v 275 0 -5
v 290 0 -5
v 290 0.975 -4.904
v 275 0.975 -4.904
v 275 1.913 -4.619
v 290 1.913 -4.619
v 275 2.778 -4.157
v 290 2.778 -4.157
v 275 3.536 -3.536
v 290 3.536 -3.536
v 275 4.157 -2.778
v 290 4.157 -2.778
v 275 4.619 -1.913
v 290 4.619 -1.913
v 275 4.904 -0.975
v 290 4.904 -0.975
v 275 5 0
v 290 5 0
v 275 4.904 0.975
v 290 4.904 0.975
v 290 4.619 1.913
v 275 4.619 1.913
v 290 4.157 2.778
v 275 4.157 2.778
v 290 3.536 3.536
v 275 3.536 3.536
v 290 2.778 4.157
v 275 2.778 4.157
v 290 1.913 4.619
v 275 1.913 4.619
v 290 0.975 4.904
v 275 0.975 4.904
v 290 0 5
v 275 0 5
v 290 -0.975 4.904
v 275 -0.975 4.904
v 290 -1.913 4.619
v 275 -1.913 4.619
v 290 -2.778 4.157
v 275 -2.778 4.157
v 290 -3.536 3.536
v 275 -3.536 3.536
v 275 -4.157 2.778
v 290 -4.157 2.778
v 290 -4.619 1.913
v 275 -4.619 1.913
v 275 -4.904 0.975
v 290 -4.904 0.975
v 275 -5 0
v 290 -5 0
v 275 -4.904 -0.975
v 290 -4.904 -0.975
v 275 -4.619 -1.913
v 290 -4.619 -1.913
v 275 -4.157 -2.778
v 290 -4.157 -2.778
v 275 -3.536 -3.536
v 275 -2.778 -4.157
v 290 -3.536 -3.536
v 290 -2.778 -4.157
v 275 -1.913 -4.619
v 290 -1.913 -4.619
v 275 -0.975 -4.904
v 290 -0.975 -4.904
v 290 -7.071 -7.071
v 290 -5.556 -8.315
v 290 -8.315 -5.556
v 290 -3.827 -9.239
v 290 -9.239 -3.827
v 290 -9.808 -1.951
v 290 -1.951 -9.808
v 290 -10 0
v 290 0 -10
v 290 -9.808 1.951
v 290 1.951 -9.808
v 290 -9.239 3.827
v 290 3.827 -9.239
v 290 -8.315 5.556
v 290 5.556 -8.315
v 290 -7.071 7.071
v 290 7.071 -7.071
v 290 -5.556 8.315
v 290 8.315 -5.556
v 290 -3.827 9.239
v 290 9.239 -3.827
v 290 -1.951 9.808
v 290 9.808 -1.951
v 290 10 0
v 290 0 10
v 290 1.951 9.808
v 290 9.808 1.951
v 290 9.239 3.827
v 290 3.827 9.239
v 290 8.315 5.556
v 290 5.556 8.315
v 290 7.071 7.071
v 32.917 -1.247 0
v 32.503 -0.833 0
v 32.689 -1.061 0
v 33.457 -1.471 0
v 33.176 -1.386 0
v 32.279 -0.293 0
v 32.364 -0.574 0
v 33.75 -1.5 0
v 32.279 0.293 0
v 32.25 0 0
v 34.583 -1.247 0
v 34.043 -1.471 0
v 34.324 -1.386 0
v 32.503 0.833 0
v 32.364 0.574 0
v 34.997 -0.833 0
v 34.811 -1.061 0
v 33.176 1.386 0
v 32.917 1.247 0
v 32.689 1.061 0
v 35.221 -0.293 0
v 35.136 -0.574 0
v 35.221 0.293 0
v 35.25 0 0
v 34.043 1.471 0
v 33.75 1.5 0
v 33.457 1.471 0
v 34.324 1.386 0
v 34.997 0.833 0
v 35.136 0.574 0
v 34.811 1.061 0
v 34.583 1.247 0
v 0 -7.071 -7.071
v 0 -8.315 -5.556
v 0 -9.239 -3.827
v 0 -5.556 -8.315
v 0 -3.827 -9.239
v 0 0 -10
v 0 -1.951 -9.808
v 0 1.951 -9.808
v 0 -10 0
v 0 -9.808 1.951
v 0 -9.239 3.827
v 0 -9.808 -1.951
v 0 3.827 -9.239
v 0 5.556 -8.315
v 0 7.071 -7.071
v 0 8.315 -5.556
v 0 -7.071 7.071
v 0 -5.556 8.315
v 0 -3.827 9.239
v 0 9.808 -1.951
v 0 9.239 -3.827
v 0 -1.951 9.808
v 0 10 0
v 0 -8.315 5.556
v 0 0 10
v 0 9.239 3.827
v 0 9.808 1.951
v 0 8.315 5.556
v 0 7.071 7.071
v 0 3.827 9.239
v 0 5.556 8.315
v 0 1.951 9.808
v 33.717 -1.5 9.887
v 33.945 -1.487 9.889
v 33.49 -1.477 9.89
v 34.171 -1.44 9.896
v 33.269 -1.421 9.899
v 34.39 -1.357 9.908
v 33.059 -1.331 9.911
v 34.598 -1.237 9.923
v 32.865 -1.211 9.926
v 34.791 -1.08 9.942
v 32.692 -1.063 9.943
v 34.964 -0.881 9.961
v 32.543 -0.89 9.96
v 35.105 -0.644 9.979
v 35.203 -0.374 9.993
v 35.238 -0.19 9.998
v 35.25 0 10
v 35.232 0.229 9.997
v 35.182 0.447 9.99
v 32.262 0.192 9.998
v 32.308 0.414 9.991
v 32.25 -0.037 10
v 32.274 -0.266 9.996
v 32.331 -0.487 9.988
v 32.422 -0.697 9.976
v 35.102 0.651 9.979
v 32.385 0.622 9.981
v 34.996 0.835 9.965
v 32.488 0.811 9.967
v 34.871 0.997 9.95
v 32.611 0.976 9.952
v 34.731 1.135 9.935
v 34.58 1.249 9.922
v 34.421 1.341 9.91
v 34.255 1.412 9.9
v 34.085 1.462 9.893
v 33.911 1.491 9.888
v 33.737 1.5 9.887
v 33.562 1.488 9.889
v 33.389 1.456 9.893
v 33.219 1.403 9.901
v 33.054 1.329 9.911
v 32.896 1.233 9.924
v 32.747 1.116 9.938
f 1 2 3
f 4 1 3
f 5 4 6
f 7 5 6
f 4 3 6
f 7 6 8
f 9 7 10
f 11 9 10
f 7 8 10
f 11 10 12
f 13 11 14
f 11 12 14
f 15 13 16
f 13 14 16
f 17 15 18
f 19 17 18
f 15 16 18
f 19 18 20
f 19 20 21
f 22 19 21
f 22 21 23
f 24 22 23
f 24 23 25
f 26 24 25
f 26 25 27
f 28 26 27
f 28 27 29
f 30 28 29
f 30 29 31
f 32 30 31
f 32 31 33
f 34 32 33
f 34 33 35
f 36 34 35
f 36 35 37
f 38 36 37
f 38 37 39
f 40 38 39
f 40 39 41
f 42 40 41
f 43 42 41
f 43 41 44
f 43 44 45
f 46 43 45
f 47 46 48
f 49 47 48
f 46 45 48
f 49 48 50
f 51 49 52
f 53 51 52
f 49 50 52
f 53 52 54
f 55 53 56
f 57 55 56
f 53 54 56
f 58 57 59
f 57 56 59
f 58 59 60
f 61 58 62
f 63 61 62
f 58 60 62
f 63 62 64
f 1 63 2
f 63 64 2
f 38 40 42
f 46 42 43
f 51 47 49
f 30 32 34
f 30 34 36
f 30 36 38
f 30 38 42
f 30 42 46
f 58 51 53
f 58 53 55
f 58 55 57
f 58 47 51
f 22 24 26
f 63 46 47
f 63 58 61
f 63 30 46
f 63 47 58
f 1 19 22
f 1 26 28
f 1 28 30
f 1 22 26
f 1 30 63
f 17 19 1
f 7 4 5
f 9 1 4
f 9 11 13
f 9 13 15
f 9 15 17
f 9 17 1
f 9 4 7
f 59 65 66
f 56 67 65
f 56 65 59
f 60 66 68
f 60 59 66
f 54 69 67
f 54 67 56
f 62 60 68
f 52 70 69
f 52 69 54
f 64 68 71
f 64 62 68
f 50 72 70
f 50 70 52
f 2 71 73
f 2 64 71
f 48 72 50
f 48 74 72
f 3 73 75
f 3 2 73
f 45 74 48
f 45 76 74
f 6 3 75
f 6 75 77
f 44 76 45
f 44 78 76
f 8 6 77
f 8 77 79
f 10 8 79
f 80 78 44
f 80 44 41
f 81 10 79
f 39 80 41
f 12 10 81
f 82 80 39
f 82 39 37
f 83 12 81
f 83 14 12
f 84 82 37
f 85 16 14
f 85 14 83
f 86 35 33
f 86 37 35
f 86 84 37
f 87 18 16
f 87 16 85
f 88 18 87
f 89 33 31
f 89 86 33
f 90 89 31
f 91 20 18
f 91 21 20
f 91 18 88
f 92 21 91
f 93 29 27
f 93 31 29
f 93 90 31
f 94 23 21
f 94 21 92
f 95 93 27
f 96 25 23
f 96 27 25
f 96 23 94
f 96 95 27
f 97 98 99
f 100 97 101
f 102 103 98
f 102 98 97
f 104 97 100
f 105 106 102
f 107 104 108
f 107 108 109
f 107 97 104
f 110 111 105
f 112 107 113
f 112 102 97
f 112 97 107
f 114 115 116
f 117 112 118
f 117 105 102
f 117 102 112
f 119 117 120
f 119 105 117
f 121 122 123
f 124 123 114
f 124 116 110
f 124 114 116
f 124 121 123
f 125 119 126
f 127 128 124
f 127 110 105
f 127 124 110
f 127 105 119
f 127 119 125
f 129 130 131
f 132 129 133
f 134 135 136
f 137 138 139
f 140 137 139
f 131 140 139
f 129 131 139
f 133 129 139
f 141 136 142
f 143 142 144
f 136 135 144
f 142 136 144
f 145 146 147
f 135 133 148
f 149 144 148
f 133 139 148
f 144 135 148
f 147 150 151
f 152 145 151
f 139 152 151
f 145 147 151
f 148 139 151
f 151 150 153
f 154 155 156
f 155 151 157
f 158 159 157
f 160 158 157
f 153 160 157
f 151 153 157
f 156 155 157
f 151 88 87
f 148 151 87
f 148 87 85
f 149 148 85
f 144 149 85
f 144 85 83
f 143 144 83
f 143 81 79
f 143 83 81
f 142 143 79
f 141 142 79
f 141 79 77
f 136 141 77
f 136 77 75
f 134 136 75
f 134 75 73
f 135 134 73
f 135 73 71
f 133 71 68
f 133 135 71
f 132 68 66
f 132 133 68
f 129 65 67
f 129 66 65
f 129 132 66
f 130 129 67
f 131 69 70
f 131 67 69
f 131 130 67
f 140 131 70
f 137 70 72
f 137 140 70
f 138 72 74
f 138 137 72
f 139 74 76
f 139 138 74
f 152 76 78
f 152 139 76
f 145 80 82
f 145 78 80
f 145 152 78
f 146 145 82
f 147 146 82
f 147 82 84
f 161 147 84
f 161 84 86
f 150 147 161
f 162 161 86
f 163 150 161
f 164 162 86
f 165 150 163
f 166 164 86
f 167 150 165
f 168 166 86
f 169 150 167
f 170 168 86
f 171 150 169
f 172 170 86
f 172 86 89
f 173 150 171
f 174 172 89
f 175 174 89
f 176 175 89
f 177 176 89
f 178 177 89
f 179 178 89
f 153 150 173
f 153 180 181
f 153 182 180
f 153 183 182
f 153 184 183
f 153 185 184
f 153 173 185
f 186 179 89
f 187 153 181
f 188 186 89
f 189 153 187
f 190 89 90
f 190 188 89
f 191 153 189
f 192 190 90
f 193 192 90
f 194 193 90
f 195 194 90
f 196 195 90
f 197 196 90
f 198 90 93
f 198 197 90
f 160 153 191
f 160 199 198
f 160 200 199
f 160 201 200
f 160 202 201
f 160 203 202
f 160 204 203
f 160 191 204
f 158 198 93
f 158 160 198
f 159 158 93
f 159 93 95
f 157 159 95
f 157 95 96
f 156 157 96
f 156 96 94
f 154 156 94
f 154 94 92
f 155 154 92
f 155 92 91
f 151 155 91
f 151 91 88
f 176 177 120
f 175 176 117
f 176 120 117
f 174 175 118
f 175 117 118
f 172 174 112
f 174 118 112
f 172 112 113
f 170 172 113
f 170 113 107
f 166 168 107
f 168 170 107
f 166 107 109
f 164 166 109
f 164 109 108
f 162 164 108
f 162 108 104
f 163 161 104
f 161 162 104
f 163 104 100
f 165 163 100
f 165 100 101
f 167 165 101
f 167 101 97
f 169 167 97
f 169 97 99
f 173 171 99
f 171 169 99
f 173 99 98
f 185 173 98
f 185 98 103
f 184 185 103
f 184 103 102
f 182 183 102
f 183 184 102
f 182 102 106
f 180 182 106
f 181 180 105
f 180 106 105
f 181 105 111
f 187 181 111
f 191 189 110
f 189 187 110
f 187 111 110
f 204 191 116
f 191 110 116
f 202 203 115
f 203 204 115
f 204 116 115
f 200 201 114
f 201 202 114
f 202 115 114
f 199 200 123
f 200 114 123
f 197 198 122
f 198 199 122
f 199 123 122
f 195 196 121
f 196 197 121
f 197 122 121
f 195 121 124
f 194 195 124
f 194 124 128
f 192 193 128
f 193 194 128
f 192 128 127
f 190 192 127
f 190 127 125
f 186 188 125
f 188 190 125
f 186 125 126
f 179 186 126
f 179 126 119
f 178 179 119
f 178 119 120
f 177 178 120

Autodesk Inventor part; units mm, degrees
ref_plane "YZ Plane" through (0, 0, 0) normal (1, 0, 0) x (0, 1, 0)
ref_plane "XZ Plane" through (0, 0, 0) normal (0, 1, 0) x (-1, 0, 0)
ref_plane "XY Plane" through (0, 0, 0) normal (0, 0, 1) x (1, 0, 0)
sketch "Boceto1" plane through (0, 0, 0) normal (0, 0, 1) x (1, 0, 0)
  line L0 (0, 0) -> (290, 0)
  line L1 (290, 0) -> (290, 10)
  line L2 (0, 10) -> (0, 0)
  line L3 (290, 10) -> (0, 10)
  dimension "d0" = 10
  dimension "d1" = 290
revolve "Revolución1" add sketch "Boceto1" angle 360 about axis through (0, 0, 0) along (1, 0, 0)
sketch "Boceto3" plane through (290, 0, 0) normal (1, 0, 0) x (0, 0, -1)
  circle A0 centre (0, 0) radius 5
  dimension "d10" = 10
extrude "Extrusión2" cut sketch "Boceto3" against normal blind 15
thread "Rosca1" size "M10x1.5" class "6H" standard "ANSI Metric M Profile" full length
sketch "Sketch4" plane through (0, 0, 0) normal (0, 0, 1) x (1, 0, 0)
  circle A0 centre (33.75, 0) radius 1.5
  line L0 (0, -10) -> (0, 10) projected
  point P0 (0, 0)
  dimension "d15" = 3
  dimension "d16" = 33.75
extrude "Extrusion3" cut sketch "Sketch4" along normal blind 33.75
thread "Thread2" size "M3x0.5" class "6H" standard "ANSI Metric M Profile" full length
equation "\"d17\" = d16"
properties part number "Eje_Base" material "Acero, carbono"
